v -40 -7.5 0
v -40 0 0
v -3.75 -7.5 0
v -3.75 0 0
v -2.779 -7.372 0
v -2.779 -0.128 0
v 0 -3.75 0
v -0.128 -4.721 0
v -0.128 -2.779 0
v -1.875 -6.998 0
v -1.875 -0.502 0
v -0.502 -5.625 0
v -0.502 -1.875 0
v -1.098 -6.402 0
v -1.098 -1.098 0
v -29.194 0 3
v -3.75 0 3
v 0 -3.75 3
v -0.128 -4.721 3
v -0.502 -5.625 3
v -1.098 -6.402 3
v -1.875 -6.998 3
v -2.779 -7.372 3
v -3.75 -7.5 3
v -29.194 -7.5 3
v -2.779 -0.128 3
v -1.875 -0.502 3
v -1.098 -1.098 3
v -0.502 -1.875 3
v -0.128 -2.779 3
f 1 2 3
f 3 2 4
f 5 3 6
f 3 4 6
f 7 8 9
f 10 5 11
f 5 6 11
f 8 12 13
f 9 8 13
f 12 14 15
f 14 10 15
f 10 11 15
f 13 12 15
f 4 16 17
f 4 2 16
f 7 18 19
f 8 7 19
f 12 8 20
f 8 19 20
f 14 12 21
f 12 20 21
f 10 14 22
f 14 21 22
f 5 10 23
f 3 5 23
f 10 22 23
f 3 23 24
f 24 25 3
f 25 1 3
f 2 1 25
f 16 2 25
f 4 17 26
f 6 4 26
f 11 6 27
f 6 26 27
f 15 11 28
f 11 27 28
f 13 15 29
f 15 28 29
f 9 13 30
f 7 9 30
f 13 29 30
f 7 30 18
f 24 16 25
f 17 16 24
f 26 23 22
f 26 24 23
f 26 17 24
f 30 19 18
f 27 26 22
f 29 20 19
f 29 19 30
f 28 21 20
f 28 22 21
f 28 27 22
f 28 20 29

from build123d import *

# Parameters (mm, degrees)
F0_W     = 40
F0_H     = 7.5
F1_DEPTH = 3
F3_DEPTH = 10
F5_DEPTH = 3


with BuildPart() as f1:
    # F0 (on Top) → F1 (new body)
    with BuildSketch(Plane.XY):
        with Locations((-20, -3.75)):
            Rectangle(F0_W, F0_H)
    extrude(amount=F1_DEPTH)

    # F2 (on face) → F3 (cut)
    with BuildSketch(Plane.XZ.offset(7.5)):
        Polygon((-40, 3), (-40, 0), (-29.1941203177, 3), align=None)
    extrude(amount=-F3_DEPTH, mode=Mode.SUBTRACT)

    # F4 (on face) → F5 (cut)
    with BuildSketch(Plane.XY.offset(3)):
        with BuildLine():
            ThreePointArc((-3.75, 0), (-1.0983495706, -1.0983495706), (0, -3.75))
            Line((0, -3.75), (0, 0))
            Line((0, 0), (-3.75, 0))
        make_face()
        with BuildLine():
            Line((0, -7.5), (0, -3.75))
            ThreePointArc((0, -3.75), (-1.0983495706, -6.4016504294), (-3.75, -7.5))
            Line((-3.75, -7.5), (0, -7.5))
        make_face()
    extrude(amount=-F5_DEPTH, mode=Mode.SUBTRACT)


solid = f1.part
